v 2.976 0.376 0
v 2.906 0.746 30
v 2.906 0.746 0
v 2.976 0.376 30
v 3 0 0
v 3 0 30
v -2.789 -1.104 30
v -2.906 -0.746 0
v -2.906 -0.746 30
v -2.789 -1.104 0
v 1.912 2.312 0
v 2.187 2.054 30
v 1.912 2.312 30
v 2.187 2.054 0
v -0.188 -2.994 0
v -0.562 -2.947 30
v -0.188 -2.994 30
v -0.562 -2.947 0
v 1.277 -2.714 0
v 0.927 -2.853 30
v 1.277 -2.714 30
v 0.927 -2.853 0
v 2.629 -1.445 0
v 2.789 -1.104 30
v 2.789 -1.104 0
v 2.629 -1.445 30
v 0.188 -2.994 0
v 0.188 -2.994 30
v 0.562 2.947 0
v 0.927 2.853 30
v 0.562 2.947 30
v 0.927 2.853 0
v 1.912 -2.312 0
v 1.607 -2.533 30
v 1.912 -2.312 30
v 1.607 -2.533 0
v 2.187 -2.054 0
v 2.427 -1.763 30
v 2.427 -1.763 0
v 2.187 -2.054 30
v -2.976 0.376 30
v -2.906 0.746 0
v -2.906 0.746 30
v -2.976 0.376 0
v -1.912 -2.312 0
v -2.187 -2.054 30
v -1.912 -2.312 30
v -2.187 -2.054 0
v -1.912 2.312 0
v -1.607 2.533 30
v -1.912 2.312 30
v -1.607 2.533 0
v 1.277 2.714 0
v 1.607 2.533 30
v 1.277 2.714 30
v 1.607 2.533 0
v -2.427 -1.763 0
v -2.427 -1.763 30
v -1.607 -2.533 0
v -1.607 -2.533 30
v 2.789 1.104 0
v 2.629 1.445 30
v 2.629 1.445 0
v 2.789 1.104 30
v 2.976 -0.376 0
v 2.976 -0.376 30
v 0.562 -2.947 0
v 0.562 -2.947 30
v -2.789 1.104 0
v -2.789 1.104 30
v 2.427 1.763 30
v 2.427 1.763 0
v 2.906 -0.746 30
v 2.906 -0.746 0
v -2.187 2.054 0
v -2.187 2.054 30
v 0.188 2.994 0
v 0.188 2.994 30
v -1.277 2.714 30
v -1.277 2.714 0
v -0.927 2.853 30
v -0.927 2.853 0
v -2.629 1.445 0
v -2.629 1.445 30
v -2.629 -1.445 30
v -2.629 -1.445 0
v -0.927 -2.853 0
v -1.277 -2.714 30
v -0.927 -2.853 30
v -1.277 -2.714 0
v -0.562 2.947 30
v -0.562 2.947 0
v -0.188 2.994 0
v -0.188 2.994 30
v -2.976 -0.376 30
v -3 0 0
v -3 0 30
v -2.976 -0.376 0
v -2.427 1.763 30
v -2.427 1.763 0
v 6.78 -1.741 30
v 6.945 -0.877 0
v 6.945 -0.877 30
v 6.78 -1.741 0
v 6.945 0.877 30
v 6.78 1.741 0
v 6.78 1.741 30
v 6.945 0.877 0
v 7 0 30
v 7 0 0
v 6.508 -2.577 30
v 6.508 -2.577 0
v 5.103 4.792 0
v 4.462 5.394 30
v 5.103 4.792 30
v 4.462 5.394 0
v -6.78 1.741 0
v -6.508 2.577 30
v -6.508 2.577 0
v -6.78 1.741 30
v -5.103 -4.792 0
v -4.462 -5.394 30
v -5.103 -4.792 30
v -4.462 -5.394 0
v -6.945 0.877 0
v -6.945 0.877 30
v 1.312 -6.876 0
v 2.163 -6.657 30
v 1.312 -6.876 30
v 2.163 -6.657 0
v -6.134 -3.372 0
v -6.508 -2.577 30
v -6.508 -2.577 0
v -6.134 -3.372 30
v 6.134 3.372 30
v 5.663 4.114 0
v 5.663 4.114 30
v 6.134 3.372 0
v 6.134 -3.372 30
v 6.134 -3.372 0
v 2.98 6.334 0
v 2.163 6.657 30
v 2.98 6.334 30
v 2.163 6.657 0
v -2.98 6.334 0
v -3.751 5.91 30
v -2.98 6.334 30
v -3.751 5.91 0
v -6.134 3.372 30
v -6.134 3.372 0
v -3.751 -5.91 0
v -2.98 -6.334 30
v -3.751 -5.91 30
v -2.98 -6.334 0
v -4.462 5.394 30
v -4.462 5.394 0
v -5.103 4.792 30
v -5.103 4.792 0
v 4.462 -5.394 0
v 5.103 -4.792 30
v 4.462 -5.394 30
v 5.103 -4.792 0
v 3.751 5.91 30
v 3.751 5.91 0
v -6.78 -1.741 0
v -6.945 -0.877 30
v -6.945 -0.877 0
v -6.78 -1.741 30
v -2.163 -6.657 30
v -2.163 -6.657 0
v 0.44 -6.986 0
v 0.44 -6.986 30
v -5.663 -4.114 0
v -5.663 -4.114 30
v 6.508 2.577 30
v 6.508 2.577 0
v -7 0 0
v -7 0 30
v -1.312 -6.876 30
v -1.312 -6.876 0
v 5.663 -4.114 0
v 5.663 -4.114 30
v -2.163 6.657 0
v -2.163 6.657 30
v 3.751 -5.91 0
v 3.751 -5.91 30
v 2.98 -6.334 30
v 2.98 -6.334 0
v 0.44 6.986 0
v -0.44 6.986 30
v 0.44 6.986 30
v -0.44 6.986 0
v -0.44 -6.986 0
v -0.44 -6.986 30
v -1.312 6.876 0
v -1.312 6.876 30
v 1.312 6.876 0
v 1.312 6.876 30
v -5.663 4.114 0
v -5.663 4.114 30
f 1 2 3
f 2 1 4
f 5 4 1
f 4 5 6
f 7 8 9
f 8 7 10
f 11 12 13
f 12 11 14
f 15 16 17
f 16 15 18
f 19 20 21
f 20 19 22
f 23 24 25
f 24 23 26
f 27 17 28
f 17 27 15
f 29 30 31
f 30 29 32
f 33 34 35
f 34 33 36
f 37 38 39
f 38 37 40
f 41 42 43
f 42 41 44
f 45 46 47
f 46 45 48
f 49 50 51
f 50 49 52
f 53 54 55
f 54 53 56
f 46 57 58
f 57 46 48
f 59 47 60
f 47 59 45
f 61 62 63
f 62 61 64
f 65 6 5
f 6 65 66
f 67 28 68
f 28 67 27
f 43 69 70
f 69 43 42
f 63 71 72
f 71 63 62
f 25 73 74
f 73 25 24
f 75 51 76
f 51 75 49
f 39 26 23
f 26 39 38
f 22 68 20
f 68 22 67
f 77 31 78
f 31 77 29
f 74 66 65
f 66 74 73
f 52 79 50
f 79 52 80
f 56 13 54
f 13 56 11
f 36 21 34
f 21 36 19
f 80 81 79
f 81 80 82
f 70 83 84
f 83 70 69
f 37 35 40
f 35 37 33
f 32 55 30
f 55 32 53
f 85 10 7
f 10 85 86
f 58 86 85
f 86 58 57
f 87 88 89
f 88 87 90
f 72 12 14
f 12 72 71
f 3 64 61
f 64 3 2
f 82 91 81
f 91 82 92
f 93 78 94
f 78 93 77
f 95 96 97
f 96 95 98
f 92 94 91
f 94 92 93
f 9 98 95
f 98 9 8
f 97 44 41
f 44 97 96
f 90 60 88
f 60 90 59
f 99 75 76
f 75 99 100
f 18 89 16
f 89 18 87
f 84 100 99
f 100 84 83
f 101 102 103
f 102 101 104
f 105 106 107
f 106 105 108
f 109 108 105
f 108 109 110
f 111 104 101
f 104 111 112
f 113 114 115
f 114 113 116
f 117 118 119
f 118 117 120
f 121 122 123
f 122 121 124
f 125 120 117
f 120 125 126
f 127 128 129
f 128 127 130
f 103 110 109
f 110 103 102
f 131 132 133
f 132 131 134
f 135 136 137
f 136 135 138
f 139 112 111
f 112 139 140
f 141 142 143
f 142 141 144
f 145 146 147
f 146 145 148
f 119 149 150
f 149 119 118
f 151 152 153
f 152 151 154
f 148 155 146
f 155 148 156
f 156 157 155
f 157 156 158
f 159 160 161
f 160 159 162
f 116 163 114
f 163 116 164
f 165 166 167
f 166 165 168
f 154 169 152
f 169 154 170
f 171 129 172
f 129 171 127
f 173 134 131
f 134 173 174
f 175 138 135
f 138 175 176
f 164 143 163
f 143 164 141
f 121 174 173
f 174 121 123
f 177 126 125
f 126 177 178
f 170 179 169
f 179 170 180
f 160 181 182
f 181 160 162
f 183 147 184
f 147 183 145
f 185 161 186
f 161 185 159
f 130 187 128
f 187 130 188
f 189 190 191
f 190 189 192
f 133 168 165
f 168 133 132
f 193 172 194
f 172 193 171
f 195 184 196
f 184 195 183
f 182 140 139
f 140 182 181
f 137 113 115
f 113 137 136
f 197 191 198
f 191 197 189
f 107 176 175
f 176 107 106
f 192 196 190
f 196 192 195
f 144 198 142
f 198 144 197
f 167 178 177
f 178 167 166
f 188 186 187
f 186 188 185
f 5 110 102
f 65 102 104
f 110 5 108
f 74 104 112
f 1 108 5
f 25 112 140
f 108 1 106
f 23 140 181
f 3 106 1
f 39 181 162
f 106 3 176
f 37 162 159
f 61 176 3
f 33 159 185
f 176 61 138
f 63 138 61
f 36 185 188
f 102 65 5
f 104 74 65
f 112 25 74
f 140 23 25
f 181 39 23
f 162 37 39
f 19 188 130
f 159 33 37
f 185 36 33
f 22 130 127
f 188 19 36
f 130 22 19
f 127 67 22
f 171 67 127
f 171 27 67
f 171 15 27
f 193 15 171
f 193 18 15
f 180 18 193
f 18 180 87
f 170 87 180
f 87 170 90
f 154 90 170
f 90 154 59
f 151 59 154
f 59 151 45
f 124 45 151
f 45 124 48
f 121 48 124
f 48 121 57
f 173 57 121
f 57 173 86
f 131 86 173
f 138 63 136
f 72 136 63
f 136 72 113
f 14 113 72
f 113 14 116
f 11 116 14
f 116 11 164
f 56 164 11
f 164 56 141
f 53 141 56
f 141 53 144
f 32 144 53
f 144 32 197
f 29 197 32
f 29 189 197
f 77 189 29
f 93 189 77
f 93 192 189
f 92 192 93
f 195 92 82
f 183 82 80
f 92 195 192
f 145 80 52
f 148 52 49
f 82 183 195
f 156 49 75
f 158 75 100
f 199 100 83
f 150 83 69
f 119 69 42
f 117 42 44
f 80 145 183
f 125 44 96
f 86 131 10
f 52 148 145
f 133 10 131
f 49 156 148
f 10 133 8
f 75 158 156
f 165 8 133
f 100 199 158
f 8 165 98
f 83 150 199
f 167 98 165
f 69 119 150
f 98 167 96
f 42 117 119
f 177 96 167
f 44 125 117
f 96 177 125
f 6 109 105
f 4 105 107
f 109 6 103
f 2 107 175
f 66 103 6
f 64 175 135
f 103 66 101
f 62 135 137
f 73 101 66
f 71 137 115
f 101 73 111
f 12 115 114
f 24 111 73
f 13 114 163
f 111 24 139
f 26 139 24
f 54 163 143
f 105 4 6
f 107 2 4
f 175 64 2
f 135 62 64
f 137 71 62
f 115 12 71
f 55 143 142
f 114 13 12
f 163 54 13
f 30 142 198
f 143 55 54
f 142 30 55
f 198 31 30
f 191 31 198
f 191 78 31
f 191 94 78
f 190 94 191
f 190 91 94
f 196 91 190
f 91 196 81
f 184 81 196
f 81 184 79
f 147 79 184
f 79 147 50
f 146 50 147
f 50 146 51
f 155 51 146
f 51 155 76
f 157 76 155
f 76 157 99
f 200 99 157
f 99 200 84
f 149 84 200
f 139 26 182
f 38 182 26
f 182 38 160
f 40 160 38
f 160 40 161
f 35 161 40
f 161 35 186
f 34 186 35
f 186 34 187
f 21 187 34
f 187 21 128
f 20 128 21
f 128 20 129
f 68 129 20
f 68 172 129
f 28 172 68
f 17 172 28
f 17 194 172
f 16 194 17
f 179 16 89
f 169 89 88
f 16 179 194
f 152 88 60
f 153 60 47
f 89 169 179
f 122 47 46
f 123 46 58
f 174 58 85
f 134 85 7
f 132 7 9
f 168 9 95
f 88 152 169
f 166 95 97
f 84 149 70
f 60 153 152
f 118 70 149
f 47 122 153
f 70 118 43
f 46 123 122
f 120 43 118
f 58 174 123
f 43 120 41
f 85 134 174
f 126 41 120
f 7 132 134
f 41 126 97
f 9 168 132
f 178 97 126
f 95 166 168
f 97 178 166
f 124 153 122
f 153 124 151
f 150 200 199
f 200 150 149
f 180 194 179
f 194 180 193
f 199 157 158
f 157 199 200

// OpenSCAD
$fn = 50;

difference() {
	union() {
		cylinder(h = 30, r = 7.0);
	}
	union() {
		translate(v = [0, 0, -100]) {
			cylinder(h = 200, r = 3.0);
		}
		translate(v = [0, 0, -100]) {
			cylinder(h = 200, r = 1.5);
		}
	}
}
